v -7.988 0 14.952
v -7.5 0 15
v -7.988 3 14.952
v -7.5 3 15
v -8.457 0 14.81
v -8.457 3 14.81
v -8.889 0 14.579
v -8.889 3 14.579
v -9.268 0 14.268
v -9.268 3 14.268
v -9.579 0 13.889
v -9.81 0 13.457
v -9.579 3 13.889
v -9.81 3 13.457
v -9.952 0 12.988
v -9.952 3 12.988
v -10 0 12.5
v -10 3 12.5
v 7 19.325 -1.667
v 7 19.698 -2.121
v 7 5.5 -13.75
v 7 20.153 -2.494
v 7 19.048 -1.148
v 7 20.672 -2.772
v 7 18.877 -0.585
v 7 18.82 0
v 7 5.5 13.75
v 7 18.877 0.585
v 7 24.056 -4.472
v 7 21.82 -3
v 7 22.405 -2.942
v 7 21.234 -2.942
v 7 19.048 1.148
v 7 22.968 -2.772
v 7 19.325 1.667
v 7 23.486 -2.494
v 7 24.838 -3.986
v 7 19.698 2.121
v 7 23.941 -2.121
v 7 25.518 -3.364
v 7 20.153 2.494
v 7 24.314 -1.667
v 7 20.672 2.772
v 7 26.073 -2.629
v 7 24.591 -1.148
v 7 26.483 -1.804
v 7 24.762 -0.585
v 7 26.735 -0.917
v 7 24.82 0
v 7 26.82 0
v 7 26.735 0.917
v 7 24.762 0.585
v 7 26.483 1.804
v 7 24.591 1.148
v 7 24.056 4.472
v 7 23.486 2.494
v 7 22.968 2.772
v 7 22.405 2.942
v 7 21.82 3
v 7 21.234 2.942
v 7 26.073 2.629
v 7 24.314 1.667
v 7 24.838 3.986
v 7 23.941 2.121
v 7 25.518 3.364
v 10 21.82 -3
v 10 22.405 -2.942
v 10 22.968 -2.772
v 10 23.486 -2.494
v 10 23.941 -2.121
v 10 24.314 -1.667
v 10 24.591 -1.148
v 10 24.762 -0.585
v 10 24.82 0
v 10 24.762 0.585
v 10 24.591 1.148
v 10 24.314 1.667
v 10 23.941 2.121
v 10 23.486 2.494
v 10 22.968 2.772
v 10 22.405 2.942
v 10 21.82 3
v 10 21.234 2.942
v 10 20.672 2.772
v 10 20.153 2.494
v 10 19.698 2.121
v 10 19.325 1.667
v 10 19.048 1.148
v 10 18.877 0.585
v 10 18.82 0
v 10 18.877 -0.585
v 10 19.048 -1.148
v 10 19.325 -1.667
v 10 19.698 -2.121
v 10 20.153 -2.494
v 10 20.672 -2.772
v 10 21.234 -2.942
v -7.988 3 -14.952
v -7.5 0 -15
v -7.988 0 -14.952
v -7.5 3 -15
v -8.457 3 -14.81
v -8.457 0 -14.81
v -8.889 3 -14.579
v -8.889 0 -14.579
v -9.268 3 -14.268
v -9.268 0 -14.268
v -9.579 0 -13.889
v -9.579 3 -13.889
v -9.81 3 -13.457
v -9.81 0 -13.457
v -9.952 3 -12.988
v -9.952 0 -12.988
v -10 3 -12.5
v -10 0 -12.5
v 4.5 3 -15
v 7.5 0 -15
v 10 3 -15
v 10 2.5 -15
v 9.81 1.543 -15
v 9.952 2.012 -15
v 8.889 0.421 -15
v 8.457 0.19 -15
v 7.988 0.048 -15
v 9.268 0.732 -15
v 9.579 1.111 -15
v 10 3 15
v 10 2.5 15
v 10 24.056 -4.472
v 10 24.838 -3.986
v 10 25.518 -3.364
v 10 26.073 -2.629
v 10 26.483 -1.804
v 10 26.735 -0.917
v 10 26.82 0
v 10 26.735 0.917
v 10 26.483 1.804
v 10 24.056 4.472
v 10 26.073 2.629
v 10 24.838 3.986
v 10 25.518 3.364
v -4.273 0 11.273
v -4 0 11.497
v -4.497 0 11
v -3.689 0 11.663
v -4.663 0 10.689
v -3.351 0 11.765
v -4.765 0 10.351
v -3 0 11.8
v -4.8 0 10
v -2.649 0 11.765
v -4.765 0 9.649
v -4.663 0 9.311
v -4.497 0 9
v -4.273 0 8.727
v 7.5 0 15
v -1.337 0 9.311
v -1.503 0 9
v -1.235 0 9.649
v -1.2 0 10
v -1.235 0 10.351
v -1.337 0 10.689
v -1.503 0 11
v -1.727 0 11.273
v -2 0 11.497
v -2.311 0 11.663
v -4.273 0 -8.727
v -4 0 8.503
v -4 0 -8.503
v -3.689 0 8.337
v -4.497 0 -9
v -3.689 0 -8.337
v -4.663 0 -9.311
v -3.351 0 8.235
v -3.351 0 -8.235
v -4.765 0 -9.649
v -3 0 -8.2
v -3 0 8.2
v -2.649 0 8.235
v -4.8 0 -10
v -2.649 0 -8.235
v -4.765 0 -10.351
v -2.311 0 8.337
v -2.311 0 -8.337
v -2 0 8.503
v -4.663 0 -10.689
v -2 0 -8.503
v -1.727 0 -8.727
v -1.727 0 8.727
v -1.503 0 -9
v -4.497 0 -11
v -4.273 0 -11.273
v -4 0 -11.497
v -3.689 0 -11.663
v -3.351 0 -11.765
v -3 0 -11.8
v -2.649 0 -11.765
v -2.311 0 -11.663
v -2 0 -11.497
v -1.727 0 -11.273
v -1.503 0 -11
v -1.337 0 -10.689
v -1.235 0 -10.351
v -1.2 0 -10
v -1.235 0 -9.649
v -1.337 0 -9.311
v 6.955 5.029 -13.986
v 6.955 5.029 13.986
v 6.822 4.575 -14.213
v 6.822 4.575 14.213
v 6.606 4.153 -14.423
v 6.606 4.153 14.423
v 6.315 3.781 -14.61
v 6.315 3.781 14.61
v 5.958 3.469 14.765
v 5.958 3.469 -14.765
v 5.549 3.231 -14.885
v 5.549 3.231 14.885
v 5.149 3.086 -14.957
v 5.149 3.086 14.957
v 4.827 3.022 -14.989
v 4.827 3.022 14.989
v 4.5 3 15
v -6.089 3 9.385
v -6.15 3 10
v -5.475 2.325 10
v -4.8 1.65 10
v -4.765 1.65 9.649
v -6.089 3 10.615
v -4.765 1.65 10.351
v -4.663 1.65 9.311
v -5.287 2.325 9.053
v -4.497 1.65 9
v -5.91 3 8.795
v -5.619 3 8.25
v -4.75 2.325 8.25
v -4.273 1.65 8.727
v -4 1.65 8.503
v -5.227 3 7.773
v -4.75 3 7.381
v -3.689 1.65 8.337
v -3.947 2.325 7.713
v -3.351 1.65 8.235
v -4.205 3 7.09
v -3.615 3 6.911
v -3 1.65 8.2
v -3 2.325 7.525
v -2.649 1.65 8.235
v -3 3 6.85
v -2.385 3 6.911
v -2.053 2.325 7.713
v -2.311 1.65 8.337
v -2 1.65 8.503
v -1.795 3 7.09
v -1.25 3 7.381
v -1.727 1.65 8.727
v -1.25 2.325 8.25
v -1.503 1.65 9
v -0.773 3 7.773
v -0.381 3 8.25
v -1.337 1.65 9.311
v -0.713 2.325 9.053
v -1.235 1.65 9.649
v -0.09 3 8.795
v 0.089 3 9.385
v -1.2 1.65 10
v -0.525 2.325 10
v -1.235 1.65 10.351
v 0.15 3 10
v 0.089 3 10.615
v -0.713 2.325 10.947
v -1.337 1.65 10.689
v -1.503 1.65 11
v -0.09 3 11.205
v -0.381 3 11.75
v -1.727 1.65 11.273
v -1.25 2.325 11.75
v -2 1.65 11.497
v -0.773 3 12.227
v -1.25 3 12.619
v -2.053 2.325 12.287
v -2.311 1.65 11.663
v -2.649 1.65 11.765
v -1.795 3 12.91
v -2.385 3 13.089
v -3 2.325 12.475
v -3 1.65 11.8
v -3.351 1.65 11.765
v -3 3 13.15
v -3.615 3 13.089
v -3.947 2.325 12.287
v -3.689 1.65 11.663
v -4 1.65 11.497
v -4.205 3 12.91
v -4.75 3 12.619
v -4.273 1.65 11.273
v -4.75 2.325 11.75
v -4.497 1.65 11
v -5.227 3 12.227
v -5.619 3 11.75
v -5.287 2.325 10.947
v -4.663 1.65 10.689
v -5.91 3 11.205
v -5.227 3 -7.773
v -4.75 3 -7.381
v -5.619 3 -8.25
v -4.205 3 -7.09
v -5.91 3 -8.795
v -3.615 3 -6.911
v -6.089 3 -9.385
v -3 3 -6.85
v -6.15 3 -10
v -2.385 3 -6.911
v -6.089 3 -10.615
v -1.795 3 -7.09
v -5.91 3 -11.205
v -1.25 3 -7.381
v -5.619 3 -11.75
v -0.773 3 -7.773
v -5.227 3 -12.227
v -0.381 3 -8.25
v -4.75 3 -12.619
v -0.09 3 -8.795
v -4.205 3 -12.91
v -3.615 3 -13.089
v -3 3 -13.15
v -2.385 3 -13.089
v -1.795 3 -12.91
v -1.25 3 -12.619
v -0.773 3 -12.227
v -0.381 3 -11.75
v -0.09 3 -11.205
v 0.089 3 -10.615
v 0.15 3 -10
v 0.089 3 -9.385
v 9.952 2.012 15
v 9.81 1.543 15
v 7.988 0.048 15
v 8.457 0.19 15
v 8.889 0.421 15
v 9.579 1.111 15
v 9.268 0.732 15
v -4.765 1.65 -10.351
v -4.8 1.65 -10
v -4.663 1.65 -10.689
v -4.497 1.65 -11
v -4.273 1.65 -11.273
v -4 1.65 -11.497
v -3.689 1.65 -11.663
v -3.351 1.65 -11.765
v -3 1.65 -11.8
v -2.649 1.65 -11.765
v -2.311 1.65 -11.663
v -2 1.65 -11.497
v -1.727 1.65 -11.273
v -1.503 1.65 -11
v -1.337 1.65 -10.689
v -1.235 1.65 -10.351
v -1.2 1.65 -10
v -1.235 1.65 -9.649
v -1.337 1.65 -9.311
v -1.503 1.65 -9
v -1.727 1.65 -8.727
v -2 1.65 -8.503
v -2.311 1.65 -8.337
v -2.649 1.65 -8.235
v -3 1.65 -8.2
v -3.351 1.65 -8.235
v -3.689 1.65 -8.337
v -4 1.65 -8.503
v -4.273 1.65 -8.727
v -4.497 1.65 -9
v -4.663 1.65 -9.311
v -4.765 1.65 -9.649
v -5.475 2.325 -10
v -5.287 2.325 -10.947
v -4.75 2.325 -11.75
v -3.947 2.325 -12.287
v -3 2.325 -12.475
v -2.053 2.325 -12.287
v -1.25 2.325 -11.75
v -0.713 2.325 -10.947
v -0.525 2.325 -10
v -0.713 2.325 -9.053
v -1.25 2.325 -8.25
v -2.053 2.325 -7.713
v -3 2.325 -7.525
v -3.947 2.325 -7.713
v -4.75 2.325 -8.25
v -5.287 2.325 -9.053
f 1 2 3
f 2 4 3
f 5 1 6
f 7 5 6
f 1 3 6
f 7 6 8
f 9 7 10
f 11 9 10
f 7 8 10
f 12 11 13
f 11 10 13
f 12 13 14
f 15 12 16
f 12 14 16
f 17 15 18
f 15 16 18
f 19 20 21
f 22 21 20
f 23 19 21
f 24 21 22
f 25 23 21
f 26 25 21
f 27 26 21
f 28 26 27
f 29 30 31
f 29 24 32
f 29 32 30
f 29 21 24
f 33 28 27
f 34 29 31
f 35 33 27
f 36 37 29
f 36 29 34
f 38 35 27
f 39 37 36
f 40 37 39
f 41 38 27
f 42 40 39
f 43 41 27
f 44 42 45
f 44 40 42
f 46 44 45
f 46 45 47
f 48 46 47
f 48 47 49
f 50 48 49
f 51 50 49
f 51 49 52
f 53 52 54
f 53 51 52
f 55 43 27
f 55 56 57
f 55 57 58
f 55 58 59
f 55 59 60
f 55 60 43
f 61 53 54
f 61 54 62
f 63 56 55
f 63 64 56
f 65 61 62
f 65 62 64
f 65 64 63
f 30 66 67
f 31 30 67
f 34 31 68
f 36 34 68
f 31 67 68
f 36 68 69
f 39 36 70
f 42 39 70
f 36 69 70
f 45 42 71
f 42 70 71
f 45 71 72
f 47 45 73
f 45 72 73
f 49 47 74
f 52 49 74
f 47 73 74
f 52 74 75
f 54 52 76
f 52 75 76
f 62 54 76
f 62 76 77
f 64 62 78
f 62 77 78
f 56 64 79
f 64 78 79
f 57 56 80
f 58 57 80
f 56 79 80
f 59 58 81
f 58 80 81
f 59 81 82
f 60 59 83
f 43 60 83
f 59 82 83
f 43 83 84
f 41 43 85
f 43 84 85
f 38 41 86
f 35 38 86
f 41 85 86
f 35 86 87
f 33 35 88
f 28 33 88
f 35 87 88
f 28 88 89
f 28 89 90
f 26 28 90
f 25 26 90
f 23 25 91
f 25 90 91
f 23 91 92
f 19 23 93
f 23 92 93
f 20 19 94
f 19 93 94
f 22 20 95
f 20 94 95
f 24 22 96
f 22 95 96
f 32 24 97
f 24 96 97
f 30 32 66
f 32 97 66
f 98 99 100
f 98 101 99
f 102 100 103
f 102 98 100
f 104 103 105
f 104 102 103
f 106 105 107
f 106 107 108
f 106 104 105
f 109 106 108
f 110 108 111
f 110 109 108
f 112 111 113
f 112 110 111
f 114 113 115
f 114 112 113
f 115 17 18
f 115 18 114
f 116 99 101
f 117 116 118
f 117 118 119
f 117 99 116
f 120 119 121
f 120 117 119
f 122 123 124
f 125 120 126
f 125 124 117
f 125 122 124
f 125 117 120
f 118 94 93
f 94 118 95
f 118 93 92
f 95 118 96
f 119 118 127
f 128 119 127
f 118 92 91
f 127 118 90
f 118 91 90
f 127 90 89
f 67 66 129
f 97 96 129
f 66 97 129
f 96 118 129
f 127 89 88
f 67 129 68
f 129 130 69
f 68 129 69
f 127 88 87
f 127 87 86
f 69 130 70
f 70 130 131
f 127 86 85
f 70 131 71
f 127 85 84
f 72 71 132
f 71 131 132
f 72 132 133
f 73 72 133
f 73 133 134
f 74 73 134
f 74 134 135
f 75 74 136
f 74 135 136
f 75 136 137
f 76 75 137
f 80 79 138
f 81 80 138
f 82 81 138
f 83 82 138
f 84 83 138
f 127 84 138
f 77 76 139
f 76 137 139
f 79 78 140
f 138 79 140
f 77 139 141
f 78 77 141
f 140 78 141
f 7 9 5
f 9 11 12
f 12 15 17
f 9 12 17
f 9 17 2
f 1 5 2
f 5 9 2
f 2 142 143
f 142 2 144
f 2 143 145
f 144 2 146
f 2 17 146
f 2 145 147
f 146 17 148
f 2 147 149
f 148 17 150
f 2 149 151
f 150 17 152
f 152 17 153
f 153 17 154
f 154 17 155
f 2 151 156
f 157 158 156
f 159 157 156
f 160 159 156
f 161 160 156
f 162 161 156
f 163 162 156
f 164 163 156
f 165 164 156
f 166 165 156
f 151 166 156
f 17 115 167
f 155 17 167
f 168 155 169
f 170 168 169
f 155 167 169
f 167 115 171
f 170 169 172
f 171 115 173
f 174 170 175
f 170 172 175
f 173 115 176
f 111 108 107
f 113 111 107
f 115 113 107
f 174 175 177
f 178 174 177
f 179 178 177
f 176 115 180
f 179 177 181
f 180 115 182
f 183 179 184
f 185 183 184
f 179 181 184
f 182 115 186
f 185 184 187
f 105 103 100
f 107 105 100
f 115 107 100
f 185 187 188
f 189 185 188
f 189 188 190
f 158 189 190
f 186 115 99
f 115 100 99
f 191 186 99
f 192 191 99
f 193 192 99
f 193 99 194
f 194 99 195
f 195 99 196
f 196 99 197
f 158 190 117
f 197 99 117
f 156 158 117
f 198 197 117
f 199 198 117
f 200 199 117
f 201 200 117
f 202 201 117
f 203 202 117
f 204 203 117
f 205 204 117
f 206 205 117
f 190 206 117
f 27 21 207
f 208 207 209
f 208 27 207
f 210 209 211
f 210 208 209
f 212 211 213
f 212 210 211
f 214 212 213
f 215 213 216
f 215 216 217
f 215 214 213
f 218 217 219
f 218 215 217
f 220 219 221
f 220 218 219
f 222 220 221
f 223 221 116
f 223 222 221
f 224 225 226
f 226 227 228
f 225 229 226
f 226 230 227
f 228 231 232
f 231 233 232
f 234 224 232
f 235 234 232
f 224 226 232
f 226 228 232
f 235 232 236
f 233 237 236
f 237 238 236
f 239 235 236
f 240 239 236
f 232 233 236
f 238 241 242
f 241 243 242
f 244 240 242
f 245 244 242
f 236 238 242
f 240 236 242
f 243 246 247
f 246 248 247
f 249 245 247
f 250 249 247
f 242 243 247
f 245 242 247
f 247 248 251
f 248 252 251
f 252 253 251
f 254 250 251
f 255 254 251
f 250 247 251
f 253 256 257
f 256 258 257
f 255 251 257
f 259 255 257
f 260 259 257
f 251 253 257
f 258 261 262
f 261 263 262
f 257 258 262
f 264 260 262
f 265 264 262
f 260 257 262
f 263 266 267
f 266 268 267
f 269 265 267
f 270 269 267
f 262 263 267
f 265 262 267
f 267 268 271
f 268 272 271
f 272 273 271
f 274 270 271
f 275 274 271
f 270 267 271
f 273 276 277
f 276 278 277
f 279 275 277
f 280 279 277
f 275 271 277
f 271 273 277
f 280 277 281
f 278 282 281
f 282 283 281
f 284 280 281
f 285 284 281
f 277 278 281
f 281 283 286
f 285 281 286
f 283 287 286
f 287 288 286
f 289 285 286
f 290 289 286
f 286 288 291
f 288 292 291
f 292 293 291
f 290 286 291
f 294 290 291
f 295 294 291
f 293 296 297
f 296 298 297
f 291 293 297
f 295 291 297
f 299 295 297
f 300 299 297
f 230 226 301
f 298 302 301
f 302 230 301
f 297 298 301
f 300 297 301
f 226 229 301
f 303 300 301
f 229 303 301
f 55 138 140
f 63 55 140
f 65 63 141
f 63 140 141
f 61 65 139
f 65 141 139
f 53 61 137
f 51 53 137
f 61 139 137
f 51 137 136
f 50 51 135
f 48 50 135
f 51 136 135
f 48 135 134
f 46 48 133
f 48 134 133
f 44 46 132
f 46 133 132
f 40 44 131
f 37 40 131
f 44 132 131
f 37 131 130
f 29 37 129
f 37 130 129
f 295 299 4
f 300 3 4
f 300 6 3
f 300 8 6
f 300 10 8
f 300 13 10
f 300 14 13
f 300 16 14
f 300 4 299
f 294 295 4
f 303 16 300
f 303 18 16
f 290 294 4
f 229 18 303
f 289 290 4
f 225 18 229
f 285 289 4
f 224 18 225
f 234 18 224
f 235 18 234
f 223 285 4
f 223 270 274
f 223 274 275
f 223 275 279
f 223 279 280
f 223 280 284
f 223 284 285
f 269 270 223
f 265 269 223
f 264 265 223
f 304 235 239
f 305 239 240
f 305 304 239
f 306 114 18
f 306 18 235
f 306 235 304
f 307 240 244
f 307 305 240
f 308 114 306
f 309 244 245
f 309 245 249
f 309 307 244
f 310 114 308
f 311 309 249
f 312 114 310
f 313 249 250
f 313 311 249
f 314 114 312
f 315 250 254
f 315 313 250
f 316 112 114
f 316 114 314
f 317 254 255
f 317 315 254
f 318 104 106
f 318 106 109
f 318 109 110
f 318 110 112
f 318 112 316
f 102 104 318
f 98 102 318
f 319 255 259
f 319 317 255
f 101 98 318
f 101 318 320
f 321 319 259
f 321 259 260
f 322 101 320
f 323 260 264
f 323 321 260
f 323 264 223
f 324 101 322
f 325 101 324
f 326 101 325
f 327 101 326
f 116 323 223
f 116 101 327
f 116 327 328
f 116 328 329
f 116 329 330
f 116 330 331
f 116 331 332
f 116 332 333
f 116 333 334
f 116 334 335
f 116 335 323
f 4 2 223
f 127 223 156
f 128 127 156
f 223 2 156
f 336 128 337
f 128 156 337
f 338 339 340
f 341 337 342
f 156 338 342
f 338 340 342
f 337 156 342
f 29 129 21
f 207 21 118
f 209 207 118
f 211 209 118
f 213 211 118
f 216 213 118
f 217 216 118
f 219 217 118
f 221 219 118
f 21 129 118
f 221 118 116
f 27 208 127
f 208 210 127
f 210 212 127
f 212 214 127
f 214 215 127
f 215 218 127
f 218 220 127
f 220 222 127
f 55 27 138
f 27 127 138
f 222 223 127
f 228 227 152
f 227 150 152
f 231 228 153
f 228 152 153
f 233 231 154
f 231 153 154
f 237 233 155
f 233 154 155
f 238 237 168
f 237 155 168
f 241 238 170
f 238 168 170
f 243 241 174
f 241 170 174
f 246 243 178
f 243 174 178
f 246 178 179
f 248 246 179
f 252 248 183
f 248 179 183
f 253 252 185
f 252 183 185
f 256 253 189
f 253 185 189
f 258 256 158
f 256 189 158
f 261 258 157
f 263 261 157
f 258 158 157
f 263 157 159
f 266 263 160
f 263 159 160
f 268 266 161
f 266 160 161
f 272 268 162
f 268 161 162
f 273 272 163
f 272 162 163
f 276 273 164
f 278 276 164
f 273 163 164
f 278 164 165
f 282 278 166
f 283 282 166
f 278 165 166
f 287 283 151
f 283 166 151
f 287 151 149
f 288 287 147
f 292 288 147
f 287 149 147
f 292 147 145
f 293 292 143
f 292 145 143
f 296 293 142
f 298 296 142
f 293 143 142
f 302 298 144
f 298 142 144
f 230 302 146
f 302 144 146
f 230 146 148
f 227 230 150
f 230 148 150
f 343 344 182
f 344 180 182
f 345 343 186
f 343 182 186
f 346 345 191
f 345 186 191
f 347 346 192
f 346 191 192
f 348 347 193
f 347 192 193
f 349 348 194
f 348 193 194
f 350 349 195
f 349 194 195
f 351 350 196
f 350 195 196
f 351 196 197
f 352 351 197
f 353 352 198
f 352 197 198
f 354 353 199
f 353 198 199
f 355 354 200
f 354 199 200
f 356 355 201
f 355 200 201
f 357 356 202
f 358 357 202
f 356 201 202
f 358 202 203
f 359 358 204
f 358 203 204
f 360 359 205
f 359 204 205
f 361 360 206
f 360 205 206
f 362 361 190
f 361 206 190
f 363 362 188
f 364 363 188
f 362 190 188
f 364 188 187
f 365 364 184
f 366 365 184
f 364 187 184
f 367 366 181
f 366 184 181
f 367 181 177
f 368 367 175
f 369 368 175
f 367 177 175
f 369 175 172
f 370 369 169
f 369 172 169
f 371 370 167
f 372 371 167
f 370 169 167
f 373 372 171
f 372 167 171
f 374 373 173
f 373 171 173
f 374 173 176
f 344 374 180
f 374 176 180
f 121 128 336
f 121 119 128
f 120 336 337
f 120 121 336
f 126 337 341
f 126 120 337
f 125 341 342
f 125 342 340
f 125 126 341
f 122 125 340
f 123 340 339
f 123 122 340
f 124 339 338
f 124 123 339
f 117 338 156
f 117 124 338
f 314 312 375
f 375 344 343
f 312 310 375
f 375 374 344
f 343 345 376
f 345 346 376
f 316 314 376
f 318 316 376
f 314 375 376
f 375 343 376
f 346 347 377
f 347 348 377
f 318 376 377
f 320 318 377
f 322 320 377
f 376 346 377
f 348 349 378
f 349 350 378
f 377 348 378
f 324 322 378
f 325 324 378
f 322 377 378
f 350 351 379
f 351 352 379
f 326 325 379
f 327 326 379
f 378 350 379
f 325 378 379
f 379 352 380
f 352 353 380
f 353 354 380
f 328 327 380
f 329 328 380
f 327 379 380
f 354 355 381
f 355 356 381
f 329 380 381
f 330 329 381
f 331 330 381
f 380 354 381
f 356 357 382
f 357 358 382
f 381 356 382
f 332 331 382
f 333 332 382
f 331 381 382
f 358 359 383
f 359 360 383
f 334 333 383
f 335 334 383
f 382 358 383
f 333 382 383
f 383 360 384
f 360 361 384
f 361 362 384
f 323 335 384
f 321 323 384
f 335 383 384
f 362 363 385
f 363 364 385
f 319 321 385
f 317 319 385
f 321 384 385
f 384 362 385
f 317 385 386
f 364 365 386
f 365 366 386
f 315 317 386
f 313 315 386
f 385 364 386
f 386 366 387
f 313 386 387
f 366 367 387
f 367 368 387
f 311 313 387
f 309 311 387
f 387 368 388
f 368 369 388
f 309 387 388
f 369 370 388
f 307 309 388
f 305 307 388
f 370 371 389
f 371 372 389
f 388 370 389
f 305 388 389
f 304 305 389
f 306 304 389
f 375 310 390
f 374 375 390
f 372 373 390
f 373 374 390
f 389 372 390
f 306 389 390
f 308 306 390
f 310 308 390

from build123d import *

# Parameters (mm, degrees)
SKETCH1_W                                       = 20
SKETCH1_H                                       = 30
BOSS_EXTRUDE1_DEPTH                             = 3
SKETCH3_R                                       = 3
BOSS_EXTRUDE2_DEPTH                             = 3
FILLET1_R                                       = 2.5
CSK_FOR_M3_FLAT_HEAD_MACHINE_SCREW1_D           = 3.6
CSK_FOR_M3_FLAT_HEAD_MACHINE_SCREW1_DEPTH       = 5
CSK_FOR_M3_FLAT_HEAD_MACHINE_SCREW1_CSINK_D     = 6.3
CSK_FOR_M3_FLAT_HEAD_MACHINE_SCREW1_CSINK_ANGLE = 90
CSK_FOR_M3_FLAT_HEAD_MACHINE_SCREW1_TIP         = 1.081549114
FILLET2_R                                       = 2.5


with BuildPart() as part:
    # Sketch1 → Boss-Extrude1 (new body)
    with BuildSketch(Plane(origin=(0, 0, 0), x_dir=(1, 0, 0), z_dir=(0, 1, 0))):
        Rectangle(SKETCH1_W, SKETCH1_H)
    extrude(amount=BOSS_EXTRUDE1_DEPTH)

    # Sketch3 → Boss-Extrude2 (add)
    with BuildSketch(Plane(origin=(10, 0, 0), x_dir=(0, 0, -1), z_dir=(1, 0, 0))):
        with BuildLine():
            ThreePointArc((-4.472135955, 24.05572809), (0, 26.819660113), (4.472135955, 24.05572809))
            Line((4.472135955, 24.05572809), (15, 3))
            Line((15, 3), (-15, 3))
            Line((-15, 3), (-4.472135955, 24.05572809))
        make_face()
        with Locations((0, 21.819660113)):
            Circle(SKETCH3_R, mode=Mode.SUBTRACT)
    extrude(amount=-BOSS_EXTRUDE2_DEPTH)

    # Fillet1
    fillet1_edges = [part.edges().sort_by_distance(p)[0] for p in [
        (10, 0, 0),
        (-10, 1.5, -15),
        (-10, 1.5, 15),
    ]]
    fillet(fillet1_edges, radius=FILLET1_R)

    # CSK for M3 Flat Head Machine Screw1
    with Locations(Plane(origin=(0, 3, 0), x_dir=(1, 0, 0), z_dir=(0, 1, 0))):
        with Locations((-3, 10), (-3, -10)):
            CounterSinkHole(CSK_FOR_M3_FLAT_HEAD_MACHINE_SCREW1_D / 2, CSK_FOR_M3_FLAT_HEAD_MACHINE_SCREW1_CSINK_D / 2, depth=CSK_FOR_M3_FLAT_HEAD_MACHINE_SCREW1_DEPTH, counter_sink_angle=CSK_FOR_M3_FLAT_HEAD_MACHINE_SCREW1_CSINK_ANGLE)
            with Locations((0, 0, -(CSK_FOR_M3_FLAT_HEAD_MACHINE_SCREW1_DEPTH + CSK_FOR_M3_FLAT_HEAD_MACHINE_SCREW1_TIP / 2))):  # 118° drill point
                Cone(0, CSK_FOR_M3_FLAT_HEAD_MACHINE_SCREW1_D / 2, CSK_FOR_M3_FLAT_HEAD_MACHINE_SCREW1_TIP, mode=Mode.SUBTRACT)

    # Fillet2
    fillet2_edges = [part.edges().sort_by_distance(p)[0] for p in [
        (7, 3, 0),
    ]]
    fillet(fillet2_edges, radius=FILLET2_R)


solid = part.part
